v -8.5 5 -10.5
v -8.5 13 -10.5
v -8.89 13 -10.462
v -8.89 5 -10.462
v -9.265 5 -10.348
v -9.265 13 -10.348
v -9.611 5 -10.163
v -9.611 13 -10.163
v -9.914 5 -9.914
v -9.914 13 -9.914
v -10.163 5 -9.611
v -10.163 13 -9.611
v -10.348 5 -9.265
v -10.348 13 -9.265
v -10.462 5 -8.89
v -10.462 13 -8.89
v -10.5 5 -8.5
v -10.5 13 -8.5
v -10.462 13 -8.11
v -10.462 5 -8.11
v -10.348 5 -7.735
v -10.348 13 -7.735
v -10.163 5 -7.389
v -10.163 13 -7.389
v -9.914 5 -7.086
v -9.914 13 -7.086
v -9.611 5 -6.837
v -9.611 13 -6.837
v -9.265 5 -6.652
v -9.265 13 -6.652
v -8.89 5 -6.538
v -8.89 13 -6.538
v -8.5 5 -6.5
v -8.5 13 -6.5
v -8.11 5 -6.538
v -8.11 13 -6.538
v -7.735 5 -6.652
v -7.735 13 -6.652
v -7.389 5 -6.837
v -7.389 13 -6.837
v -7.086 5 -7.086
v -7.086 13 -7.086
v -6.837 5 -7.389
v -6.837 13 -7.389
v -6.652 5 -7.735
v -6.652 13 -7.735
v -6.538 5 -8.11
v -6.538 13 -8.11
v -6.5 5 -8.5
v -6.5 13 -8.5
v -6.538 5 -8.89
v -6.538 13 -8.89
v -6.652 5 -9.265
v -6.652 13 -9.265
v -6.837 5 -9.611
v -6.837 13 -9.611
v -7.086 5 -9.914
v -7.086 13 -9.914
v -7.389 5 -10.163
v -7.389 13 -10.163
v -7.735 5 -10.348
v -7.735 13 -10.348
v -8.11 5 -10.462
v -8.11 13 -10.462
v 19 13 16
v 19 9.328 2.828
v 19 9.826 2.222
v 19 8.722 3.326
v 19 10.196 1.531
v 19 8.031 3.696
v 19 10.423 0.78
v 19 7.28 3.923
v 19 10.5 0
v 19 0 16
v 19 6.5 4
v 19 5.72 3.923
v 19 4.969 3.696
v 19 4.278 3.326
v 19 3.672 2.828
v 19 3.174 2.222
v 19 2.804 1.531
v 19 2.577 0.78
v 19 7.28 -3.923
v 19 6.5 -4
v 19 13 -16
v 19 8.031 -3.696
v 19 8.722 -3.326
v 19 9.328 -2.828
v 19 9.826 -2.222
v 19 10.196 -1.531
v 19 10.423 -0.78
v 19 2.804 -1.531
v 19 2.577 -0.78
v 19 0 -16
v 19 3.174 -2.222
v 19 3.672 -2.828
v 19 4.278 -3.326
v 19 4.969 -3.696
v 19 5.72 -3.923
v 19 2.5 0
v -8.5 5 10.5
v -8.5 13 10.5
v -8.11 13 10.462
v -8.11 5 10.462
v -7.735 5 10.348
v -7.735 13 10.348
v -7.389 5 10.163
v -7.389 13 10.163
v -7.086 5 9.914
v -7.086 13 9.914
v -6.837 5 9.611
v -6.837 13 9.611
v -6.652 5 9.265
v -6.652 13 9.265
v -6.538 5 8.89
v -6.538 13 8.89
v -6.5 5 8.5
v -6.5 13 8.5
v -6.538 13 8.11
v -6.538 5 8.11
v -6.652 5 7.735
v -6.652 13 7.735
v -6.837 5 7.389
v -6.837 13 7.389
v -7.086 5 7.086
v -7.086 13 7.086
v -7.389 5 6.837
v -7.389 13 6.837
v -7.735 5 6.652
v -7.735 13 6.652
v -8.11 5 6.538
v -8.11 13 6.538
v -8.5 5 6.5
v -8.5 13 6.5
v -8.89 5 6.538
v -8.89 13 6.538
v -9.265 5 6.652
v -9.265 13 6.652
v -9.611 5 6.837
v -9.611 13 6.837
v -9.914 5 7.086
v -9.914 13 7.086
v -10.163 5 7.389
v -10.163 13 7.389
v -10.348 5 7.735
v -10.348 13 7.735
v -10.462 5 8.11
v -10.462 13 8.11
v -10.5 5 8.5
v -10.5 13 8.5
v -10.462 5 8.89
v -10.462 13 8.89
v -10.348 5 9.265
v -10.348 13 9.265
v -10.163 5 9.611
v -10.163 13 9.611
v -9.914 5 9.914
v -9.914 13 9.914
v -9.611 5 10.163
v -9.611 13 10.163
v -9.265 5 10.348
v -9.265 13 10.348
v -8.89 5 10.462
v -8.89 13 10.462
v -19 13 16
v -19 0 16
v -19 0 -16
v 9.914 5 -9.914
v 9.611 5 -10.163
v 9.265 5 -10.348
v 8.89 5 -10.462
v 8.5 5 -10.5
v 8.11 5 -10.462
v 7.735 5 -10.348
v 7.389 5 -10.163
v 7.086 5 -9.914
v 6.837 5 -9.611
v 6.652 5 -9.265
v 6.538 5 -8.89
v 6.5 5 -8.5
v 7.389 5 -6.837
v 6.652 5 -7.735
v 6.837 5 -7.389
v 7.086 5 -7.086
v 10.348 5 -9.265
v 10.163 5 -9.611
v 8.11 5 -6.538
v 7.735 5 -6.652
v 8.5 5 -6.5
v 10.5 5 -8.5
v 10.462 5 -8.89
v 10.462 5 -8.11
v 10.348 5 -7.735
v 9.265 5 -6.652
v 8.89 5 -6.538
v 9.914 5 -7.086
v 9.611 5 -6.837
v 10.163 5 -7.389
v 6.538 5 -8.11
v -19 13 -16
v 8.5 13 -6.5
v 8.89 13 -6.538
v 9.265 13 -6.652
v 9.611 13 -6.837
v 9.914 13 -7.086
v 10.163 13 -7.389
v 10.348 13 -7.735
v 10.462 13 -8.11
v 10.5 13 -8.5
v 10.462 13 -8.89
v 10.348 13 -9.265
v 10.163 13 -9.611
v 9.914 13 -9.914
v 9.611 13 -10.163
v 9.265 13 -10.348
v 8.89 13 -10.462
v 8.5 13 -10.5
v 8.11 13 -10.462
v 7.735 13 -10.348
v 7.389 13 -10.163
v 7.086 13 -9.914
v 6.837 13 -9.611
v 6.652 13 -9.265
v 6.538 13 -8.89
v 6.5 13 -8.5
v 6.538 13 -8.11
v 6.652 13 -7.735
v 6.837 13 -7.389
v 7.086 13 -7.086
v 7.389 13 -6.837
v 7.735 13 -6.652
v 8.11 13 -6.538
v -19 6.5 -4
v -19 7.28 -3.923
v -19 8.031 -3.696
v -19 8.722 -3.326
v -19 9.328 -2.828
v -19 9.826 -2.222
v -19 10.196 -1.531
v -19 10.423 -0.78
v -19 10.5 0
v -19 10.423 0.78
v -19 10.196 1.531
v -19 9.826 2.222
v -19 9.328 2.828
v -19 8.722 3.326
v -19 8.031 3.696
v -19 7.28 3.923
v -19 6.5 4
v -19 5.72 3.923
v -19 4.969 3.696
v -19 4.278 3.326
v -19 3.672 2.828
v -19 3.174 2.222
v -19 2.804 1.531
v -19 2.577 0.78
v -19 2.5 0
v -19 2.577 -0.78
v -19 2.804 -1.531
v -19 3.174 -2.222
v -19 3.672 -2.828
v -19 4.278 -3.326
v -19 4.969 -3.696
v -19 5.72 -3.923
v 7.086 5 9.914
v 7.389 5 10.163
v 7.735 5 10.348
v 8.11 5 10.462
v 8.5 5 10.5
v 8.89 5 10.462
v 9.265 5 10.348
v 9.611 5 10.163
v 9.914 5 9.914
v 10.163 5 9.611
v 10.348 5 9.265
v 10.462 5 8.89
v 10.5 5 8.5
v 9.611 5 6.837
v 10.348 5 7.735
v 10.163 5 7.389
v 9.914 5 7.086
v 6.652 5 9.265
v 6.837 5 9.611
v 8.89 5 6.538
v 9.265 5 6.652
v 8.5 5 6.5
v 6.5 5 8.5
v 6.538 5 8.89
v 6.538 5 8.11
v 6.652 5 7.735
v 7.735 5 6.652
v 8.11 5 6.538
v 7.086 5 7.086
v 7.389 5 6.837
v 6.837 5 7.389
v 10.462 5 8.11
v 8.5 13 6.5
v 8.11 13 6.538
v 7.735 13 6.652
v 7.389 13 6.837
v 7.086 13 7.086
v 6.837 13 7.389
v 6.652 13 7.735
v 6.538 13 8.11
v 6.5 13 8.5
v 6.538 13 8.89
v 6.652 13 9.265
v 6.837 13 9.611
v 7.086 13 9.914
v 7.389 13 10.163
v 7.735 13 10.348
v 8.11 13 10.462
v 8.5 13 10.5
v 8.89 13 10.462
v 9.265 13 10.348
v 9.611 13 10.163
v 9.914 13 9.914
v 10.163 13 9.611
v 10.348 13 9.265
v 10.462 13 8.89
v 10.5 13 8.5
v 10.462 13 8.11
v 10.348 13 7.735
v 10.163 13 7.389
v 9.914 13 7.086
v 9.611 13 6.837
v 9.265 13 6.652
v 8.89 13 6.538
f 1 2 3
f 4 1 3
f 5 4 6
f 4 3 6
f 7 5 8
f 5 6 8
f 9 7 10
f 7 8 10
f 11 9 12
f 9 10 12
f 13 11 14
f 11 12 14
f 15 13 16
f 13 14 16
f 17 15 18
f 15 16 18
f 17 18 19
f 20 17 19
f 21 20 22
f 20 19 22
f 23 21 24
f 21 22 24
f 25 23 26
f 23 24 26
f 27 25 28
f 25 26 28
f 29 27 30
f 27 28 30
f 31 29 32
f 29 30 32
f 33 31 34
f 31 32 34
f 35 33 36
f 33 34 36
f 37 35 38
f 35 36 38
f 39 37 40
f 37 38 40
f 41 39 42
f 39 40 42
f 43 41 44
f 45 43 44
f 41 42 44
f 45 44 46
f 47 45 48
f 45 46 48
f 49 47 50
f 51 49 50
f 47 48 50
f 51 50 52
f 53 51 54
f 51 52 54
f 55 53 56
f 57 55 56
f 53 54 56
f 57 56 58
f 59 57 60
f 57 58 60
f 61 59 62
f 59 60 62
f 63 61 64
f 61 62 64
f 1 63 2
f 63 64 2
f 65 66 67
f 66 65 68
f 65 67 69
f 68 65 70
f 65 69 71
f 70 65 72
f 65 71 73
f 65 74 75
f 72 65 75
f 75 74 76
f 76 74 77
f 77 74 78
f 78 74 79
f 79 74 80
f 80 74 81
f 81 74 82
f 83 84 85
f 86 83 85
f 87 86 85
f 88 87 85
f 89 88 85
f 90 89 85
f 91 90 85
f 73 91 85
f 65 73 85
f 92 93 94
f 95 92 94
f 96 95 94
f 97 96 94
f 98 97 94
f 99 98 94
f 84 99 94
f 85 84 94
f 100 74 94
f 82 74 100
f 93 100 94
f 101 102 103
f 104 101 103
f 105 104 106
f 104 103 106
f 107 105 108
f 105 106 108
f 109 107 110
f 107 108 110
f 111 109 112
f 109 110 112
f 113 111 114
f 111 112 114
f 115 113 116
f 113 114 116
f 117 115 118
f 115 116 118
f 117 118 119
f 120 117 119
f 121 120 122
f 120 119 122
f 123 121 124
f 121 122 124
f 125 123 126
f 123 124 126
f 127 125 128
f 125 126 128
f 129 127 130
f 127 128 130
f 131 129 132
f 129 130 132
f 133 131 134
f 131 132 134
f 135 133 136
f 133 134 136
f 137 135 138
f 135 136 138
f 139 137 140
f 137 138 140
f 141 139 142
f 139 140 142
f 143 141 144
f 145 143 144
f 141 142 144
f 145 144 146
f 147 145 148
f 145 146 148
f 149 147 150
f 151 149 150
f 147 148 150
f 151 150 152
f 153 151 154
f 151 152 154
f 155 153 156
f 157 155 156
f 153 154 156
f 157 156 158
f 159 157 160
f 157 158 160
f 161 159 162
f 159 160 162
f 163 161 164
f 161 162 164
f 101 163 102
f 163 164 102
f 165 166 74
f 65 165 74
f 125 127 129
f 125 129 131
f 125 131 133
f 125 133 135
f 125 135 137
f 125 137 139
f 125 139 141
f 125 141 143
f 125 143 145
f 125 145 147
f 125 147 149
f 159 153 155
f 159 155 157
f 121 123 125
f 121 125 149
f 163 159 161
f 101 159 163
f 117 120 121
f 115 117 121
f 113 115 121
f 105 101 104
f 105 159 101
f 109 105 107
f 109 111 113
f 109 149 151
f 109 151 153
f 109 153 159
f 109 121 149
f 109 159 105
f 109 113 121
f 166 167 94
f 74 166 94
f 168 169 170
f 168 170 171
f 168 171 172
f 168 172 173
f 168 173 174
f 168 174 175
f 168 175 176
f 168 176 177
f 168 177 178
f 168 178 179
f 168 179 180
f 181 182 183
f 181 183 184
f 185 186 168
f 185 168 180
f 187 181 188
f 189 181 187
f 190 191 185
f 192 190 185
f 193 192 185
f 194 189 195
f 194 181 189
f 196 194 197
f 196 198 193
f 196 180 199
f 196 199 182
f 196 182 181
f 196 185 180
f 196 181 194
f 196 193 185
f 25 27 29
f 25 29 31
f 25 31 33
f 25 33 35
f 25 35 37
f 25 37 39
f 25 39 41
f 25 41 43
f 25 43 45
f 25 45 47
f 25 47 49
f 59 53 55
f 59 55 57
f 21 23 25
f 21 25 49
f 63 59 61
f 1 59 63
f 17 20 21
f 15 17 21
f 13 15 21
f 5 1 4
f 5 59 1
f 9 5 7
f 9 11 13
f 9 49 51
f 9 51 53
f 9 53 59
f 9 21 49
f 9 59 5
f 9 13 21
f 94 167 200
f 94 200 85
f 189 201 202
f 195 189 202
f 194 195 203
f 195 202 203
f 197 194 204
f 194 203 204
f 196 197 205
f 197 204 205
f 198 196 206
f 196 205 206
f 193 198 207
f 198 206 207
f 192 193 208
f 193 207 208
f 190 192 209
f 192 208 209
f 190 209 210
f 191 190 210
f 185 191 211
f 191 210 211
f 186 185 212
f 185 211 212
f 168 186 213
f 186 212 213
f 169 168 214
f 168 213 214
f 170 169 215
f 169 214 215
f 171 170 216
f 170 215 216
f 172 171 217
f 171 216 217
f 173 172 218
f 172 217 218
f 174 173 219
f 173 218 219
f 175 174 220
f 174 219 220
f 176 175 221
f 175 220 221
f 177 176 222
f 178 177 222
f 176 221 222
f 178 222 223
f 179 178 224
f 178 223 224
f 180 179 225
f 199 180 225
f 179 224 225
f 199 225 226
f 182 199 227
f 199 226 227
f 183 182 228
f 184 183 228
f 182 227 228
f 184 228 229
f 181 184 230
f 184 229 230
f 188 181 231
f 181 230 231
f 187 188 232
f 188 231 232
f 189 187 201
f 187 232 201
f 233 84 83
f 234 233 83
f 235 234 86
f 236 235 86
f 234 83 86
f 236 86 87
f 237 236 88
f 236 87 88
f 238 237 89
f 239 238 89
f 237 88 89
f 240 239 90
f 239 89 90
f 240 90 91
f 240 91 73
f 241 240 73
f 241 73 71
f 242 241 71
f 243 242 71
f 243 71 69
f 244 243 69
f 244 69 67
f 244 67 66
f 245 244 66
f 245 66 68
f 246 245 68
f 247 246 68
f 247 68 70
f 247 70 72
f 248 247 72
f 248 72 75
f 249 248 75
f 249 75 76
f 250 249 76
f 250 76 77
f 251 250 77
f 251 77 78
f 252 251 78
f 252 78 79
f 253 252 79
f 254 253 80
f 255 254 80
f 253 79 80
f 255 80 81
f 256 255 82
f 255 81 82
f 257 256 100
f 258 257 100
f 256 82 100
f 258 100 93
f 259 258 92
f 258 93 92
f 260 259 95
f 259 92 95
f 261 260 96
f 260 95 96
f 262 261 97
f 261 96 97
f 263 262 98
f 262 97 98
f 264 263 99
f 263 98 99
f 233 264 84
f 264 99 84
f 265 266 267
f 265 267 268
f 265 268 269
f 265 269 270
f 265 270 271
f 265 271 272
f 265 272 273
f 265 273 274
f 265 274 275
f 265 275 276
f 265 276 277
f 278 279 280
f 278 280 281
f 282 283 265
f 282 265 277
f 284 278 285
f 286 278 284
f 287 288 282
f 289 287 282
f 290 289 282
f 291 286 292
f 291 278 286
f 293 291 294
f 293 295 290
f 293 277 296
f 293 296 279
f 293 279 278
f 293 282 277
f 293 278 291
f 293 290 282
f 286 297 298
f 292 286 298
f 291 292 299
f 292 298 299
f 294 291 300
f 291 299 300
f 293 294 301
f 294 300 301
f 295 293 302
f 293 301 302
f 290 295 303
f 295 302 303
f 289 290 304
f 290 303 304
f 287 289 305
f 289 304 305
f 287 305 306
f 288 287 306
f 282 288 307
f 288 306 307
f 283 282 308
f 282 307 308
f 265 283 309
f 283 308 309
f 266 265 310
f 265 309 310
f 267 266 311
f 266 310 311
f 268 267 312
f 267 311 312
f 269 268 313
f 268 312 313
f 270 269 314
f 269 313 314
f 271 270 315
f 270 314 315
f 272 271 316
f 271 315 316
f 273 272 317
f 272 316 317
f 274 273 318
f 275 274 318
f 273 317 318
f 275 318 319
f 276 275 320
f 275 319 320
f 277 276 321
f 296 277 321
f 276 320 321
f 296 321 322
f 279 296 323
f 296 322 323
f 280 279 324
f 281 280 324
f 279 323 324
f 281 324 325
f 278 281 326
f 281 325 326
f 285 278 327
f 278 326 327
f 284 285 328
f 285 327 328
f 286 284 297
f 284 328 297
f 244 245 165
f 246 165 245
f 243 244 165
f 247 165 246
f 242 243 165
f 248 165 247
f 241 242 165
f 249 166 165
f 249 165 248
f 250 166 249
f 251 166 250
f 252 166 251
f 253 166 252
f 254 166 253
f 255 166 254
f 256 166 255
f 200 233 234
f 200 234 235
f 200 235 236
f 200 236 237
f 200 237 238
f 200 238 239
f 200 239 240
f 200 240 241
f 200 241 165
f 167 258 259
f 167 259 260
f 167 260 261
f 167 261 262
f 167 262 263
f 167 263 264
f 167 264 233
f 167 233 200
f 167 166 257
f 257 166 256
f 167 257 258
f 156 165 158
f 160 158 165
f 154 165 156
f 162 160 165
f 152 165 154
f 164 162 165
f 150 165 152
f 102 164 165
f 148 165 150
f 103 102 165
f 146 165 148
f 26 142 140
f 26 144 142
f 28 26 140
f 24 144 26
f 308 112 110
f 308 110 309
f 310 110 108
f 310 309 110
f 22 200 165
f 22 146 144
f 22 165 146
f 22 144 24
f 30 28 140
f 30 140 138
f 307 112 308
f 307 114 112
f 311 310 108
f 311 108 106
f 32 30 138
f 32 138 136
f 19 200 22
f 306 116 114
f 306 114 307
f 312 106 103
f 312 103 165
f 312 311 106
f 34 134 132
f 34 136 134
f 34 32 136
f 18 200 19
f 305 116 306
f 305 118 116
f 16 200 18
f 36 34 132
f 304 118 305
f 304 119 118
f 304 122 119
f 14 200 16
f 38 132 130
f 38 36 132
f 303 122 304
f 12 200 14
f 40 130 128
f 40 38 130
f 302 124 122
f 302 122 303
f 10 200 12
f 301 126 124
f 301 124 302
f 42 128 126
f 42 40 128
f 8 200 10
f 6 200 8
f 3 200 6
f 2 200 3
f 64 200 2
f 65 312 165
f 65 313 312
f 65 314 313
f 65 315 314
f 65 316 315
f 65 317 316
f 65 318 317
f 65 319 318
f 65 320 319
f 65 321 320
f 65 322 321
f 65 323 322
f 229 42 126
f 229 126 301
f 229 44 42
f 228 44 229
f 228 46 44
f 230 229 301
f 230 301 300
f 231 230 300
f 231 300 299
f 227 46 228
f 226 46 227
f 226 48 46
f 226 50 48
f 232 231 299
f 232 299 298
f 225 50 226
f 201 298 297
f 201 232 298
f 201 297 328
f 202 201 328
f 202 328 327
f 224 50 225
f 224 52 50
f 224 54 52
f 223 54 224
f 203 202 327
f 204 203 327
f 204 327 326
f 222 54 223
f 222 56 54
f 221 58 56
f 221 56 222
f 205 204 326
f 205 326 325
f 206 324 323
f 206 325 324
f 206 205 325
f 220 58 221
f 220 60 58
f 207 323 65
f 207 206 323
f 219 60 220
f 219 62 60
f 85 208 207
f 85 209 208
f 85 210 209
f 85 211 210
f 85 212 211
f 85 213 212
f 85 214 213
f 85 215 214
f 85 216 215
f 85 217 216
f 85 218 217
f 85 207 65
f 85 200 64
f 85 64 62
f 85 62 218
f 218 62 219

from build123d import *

# Parameters (mm, degrees)
SKETCH1_W           = 38
SKETCH1_H           = 32
BOSS_EXTRUDE1_DEPTH = 13
SKETCH2_R           = 2
CUT_EXTRUDE1_DEPTH  = 8
SKETCH3_R           = 4
CUT_EXTRUDE2_DEPTH  = 44.231932642


with BuildPart() as part:
    # Sketch1 → Boss-Extrude1 (new body)
    with BuildSketch(Plane(origin=(0, 0, 0), x_dir=(1, 0, 0), z_dir=(0, 1, 0))):
        Rectangle(SKETCH1_W, SKETCH1_H)
    extrude(amount=BOSS_EXTRUDE1_DEPTH)

    # Sketch2 → Cut-Extrude1 (cut)
    with BuildSketch(Plane(origin=(0, 13, 0), x_dir=(1, 0, 0), z_dir=(0, 1, 0))):
        with Locations(Location((8.5, 8.5, 0), (0, 0, 270))):
            Circle(SKETCH2_R)
        with Locations(Location((-8.5, 8.5, 0), (0, 0, 90))):
            Circle(SKETCH2_R)
        with Locations(Location((-8.5, -8.5, 0), (0, 0, 270))):
            Circle(SKETCH2_R)
        with Locations(Location((8.5, -8.5, 0), (0, 0, 90))):
            Circle(SKETCH2_R)
    extrude(amount=-CUT_EXTRUDE1_DEPTH, mode=Mode.SUBTRACT)

    # Sketch3 → Cut-Extrude2 (cut, through all)
    with BuildSketch(Plane(origin=(19, 0, 0), x_dir=(0, 0, -1), z_dir=(1, 0, 0))):
        with Locations((0, 6.5)):
            Circle(SKETCH3_R)
    extrude(amount=-CUT_EXTRUDE2_DEPTH, mode=Mode.SUBTRACT)


solid = part.part
